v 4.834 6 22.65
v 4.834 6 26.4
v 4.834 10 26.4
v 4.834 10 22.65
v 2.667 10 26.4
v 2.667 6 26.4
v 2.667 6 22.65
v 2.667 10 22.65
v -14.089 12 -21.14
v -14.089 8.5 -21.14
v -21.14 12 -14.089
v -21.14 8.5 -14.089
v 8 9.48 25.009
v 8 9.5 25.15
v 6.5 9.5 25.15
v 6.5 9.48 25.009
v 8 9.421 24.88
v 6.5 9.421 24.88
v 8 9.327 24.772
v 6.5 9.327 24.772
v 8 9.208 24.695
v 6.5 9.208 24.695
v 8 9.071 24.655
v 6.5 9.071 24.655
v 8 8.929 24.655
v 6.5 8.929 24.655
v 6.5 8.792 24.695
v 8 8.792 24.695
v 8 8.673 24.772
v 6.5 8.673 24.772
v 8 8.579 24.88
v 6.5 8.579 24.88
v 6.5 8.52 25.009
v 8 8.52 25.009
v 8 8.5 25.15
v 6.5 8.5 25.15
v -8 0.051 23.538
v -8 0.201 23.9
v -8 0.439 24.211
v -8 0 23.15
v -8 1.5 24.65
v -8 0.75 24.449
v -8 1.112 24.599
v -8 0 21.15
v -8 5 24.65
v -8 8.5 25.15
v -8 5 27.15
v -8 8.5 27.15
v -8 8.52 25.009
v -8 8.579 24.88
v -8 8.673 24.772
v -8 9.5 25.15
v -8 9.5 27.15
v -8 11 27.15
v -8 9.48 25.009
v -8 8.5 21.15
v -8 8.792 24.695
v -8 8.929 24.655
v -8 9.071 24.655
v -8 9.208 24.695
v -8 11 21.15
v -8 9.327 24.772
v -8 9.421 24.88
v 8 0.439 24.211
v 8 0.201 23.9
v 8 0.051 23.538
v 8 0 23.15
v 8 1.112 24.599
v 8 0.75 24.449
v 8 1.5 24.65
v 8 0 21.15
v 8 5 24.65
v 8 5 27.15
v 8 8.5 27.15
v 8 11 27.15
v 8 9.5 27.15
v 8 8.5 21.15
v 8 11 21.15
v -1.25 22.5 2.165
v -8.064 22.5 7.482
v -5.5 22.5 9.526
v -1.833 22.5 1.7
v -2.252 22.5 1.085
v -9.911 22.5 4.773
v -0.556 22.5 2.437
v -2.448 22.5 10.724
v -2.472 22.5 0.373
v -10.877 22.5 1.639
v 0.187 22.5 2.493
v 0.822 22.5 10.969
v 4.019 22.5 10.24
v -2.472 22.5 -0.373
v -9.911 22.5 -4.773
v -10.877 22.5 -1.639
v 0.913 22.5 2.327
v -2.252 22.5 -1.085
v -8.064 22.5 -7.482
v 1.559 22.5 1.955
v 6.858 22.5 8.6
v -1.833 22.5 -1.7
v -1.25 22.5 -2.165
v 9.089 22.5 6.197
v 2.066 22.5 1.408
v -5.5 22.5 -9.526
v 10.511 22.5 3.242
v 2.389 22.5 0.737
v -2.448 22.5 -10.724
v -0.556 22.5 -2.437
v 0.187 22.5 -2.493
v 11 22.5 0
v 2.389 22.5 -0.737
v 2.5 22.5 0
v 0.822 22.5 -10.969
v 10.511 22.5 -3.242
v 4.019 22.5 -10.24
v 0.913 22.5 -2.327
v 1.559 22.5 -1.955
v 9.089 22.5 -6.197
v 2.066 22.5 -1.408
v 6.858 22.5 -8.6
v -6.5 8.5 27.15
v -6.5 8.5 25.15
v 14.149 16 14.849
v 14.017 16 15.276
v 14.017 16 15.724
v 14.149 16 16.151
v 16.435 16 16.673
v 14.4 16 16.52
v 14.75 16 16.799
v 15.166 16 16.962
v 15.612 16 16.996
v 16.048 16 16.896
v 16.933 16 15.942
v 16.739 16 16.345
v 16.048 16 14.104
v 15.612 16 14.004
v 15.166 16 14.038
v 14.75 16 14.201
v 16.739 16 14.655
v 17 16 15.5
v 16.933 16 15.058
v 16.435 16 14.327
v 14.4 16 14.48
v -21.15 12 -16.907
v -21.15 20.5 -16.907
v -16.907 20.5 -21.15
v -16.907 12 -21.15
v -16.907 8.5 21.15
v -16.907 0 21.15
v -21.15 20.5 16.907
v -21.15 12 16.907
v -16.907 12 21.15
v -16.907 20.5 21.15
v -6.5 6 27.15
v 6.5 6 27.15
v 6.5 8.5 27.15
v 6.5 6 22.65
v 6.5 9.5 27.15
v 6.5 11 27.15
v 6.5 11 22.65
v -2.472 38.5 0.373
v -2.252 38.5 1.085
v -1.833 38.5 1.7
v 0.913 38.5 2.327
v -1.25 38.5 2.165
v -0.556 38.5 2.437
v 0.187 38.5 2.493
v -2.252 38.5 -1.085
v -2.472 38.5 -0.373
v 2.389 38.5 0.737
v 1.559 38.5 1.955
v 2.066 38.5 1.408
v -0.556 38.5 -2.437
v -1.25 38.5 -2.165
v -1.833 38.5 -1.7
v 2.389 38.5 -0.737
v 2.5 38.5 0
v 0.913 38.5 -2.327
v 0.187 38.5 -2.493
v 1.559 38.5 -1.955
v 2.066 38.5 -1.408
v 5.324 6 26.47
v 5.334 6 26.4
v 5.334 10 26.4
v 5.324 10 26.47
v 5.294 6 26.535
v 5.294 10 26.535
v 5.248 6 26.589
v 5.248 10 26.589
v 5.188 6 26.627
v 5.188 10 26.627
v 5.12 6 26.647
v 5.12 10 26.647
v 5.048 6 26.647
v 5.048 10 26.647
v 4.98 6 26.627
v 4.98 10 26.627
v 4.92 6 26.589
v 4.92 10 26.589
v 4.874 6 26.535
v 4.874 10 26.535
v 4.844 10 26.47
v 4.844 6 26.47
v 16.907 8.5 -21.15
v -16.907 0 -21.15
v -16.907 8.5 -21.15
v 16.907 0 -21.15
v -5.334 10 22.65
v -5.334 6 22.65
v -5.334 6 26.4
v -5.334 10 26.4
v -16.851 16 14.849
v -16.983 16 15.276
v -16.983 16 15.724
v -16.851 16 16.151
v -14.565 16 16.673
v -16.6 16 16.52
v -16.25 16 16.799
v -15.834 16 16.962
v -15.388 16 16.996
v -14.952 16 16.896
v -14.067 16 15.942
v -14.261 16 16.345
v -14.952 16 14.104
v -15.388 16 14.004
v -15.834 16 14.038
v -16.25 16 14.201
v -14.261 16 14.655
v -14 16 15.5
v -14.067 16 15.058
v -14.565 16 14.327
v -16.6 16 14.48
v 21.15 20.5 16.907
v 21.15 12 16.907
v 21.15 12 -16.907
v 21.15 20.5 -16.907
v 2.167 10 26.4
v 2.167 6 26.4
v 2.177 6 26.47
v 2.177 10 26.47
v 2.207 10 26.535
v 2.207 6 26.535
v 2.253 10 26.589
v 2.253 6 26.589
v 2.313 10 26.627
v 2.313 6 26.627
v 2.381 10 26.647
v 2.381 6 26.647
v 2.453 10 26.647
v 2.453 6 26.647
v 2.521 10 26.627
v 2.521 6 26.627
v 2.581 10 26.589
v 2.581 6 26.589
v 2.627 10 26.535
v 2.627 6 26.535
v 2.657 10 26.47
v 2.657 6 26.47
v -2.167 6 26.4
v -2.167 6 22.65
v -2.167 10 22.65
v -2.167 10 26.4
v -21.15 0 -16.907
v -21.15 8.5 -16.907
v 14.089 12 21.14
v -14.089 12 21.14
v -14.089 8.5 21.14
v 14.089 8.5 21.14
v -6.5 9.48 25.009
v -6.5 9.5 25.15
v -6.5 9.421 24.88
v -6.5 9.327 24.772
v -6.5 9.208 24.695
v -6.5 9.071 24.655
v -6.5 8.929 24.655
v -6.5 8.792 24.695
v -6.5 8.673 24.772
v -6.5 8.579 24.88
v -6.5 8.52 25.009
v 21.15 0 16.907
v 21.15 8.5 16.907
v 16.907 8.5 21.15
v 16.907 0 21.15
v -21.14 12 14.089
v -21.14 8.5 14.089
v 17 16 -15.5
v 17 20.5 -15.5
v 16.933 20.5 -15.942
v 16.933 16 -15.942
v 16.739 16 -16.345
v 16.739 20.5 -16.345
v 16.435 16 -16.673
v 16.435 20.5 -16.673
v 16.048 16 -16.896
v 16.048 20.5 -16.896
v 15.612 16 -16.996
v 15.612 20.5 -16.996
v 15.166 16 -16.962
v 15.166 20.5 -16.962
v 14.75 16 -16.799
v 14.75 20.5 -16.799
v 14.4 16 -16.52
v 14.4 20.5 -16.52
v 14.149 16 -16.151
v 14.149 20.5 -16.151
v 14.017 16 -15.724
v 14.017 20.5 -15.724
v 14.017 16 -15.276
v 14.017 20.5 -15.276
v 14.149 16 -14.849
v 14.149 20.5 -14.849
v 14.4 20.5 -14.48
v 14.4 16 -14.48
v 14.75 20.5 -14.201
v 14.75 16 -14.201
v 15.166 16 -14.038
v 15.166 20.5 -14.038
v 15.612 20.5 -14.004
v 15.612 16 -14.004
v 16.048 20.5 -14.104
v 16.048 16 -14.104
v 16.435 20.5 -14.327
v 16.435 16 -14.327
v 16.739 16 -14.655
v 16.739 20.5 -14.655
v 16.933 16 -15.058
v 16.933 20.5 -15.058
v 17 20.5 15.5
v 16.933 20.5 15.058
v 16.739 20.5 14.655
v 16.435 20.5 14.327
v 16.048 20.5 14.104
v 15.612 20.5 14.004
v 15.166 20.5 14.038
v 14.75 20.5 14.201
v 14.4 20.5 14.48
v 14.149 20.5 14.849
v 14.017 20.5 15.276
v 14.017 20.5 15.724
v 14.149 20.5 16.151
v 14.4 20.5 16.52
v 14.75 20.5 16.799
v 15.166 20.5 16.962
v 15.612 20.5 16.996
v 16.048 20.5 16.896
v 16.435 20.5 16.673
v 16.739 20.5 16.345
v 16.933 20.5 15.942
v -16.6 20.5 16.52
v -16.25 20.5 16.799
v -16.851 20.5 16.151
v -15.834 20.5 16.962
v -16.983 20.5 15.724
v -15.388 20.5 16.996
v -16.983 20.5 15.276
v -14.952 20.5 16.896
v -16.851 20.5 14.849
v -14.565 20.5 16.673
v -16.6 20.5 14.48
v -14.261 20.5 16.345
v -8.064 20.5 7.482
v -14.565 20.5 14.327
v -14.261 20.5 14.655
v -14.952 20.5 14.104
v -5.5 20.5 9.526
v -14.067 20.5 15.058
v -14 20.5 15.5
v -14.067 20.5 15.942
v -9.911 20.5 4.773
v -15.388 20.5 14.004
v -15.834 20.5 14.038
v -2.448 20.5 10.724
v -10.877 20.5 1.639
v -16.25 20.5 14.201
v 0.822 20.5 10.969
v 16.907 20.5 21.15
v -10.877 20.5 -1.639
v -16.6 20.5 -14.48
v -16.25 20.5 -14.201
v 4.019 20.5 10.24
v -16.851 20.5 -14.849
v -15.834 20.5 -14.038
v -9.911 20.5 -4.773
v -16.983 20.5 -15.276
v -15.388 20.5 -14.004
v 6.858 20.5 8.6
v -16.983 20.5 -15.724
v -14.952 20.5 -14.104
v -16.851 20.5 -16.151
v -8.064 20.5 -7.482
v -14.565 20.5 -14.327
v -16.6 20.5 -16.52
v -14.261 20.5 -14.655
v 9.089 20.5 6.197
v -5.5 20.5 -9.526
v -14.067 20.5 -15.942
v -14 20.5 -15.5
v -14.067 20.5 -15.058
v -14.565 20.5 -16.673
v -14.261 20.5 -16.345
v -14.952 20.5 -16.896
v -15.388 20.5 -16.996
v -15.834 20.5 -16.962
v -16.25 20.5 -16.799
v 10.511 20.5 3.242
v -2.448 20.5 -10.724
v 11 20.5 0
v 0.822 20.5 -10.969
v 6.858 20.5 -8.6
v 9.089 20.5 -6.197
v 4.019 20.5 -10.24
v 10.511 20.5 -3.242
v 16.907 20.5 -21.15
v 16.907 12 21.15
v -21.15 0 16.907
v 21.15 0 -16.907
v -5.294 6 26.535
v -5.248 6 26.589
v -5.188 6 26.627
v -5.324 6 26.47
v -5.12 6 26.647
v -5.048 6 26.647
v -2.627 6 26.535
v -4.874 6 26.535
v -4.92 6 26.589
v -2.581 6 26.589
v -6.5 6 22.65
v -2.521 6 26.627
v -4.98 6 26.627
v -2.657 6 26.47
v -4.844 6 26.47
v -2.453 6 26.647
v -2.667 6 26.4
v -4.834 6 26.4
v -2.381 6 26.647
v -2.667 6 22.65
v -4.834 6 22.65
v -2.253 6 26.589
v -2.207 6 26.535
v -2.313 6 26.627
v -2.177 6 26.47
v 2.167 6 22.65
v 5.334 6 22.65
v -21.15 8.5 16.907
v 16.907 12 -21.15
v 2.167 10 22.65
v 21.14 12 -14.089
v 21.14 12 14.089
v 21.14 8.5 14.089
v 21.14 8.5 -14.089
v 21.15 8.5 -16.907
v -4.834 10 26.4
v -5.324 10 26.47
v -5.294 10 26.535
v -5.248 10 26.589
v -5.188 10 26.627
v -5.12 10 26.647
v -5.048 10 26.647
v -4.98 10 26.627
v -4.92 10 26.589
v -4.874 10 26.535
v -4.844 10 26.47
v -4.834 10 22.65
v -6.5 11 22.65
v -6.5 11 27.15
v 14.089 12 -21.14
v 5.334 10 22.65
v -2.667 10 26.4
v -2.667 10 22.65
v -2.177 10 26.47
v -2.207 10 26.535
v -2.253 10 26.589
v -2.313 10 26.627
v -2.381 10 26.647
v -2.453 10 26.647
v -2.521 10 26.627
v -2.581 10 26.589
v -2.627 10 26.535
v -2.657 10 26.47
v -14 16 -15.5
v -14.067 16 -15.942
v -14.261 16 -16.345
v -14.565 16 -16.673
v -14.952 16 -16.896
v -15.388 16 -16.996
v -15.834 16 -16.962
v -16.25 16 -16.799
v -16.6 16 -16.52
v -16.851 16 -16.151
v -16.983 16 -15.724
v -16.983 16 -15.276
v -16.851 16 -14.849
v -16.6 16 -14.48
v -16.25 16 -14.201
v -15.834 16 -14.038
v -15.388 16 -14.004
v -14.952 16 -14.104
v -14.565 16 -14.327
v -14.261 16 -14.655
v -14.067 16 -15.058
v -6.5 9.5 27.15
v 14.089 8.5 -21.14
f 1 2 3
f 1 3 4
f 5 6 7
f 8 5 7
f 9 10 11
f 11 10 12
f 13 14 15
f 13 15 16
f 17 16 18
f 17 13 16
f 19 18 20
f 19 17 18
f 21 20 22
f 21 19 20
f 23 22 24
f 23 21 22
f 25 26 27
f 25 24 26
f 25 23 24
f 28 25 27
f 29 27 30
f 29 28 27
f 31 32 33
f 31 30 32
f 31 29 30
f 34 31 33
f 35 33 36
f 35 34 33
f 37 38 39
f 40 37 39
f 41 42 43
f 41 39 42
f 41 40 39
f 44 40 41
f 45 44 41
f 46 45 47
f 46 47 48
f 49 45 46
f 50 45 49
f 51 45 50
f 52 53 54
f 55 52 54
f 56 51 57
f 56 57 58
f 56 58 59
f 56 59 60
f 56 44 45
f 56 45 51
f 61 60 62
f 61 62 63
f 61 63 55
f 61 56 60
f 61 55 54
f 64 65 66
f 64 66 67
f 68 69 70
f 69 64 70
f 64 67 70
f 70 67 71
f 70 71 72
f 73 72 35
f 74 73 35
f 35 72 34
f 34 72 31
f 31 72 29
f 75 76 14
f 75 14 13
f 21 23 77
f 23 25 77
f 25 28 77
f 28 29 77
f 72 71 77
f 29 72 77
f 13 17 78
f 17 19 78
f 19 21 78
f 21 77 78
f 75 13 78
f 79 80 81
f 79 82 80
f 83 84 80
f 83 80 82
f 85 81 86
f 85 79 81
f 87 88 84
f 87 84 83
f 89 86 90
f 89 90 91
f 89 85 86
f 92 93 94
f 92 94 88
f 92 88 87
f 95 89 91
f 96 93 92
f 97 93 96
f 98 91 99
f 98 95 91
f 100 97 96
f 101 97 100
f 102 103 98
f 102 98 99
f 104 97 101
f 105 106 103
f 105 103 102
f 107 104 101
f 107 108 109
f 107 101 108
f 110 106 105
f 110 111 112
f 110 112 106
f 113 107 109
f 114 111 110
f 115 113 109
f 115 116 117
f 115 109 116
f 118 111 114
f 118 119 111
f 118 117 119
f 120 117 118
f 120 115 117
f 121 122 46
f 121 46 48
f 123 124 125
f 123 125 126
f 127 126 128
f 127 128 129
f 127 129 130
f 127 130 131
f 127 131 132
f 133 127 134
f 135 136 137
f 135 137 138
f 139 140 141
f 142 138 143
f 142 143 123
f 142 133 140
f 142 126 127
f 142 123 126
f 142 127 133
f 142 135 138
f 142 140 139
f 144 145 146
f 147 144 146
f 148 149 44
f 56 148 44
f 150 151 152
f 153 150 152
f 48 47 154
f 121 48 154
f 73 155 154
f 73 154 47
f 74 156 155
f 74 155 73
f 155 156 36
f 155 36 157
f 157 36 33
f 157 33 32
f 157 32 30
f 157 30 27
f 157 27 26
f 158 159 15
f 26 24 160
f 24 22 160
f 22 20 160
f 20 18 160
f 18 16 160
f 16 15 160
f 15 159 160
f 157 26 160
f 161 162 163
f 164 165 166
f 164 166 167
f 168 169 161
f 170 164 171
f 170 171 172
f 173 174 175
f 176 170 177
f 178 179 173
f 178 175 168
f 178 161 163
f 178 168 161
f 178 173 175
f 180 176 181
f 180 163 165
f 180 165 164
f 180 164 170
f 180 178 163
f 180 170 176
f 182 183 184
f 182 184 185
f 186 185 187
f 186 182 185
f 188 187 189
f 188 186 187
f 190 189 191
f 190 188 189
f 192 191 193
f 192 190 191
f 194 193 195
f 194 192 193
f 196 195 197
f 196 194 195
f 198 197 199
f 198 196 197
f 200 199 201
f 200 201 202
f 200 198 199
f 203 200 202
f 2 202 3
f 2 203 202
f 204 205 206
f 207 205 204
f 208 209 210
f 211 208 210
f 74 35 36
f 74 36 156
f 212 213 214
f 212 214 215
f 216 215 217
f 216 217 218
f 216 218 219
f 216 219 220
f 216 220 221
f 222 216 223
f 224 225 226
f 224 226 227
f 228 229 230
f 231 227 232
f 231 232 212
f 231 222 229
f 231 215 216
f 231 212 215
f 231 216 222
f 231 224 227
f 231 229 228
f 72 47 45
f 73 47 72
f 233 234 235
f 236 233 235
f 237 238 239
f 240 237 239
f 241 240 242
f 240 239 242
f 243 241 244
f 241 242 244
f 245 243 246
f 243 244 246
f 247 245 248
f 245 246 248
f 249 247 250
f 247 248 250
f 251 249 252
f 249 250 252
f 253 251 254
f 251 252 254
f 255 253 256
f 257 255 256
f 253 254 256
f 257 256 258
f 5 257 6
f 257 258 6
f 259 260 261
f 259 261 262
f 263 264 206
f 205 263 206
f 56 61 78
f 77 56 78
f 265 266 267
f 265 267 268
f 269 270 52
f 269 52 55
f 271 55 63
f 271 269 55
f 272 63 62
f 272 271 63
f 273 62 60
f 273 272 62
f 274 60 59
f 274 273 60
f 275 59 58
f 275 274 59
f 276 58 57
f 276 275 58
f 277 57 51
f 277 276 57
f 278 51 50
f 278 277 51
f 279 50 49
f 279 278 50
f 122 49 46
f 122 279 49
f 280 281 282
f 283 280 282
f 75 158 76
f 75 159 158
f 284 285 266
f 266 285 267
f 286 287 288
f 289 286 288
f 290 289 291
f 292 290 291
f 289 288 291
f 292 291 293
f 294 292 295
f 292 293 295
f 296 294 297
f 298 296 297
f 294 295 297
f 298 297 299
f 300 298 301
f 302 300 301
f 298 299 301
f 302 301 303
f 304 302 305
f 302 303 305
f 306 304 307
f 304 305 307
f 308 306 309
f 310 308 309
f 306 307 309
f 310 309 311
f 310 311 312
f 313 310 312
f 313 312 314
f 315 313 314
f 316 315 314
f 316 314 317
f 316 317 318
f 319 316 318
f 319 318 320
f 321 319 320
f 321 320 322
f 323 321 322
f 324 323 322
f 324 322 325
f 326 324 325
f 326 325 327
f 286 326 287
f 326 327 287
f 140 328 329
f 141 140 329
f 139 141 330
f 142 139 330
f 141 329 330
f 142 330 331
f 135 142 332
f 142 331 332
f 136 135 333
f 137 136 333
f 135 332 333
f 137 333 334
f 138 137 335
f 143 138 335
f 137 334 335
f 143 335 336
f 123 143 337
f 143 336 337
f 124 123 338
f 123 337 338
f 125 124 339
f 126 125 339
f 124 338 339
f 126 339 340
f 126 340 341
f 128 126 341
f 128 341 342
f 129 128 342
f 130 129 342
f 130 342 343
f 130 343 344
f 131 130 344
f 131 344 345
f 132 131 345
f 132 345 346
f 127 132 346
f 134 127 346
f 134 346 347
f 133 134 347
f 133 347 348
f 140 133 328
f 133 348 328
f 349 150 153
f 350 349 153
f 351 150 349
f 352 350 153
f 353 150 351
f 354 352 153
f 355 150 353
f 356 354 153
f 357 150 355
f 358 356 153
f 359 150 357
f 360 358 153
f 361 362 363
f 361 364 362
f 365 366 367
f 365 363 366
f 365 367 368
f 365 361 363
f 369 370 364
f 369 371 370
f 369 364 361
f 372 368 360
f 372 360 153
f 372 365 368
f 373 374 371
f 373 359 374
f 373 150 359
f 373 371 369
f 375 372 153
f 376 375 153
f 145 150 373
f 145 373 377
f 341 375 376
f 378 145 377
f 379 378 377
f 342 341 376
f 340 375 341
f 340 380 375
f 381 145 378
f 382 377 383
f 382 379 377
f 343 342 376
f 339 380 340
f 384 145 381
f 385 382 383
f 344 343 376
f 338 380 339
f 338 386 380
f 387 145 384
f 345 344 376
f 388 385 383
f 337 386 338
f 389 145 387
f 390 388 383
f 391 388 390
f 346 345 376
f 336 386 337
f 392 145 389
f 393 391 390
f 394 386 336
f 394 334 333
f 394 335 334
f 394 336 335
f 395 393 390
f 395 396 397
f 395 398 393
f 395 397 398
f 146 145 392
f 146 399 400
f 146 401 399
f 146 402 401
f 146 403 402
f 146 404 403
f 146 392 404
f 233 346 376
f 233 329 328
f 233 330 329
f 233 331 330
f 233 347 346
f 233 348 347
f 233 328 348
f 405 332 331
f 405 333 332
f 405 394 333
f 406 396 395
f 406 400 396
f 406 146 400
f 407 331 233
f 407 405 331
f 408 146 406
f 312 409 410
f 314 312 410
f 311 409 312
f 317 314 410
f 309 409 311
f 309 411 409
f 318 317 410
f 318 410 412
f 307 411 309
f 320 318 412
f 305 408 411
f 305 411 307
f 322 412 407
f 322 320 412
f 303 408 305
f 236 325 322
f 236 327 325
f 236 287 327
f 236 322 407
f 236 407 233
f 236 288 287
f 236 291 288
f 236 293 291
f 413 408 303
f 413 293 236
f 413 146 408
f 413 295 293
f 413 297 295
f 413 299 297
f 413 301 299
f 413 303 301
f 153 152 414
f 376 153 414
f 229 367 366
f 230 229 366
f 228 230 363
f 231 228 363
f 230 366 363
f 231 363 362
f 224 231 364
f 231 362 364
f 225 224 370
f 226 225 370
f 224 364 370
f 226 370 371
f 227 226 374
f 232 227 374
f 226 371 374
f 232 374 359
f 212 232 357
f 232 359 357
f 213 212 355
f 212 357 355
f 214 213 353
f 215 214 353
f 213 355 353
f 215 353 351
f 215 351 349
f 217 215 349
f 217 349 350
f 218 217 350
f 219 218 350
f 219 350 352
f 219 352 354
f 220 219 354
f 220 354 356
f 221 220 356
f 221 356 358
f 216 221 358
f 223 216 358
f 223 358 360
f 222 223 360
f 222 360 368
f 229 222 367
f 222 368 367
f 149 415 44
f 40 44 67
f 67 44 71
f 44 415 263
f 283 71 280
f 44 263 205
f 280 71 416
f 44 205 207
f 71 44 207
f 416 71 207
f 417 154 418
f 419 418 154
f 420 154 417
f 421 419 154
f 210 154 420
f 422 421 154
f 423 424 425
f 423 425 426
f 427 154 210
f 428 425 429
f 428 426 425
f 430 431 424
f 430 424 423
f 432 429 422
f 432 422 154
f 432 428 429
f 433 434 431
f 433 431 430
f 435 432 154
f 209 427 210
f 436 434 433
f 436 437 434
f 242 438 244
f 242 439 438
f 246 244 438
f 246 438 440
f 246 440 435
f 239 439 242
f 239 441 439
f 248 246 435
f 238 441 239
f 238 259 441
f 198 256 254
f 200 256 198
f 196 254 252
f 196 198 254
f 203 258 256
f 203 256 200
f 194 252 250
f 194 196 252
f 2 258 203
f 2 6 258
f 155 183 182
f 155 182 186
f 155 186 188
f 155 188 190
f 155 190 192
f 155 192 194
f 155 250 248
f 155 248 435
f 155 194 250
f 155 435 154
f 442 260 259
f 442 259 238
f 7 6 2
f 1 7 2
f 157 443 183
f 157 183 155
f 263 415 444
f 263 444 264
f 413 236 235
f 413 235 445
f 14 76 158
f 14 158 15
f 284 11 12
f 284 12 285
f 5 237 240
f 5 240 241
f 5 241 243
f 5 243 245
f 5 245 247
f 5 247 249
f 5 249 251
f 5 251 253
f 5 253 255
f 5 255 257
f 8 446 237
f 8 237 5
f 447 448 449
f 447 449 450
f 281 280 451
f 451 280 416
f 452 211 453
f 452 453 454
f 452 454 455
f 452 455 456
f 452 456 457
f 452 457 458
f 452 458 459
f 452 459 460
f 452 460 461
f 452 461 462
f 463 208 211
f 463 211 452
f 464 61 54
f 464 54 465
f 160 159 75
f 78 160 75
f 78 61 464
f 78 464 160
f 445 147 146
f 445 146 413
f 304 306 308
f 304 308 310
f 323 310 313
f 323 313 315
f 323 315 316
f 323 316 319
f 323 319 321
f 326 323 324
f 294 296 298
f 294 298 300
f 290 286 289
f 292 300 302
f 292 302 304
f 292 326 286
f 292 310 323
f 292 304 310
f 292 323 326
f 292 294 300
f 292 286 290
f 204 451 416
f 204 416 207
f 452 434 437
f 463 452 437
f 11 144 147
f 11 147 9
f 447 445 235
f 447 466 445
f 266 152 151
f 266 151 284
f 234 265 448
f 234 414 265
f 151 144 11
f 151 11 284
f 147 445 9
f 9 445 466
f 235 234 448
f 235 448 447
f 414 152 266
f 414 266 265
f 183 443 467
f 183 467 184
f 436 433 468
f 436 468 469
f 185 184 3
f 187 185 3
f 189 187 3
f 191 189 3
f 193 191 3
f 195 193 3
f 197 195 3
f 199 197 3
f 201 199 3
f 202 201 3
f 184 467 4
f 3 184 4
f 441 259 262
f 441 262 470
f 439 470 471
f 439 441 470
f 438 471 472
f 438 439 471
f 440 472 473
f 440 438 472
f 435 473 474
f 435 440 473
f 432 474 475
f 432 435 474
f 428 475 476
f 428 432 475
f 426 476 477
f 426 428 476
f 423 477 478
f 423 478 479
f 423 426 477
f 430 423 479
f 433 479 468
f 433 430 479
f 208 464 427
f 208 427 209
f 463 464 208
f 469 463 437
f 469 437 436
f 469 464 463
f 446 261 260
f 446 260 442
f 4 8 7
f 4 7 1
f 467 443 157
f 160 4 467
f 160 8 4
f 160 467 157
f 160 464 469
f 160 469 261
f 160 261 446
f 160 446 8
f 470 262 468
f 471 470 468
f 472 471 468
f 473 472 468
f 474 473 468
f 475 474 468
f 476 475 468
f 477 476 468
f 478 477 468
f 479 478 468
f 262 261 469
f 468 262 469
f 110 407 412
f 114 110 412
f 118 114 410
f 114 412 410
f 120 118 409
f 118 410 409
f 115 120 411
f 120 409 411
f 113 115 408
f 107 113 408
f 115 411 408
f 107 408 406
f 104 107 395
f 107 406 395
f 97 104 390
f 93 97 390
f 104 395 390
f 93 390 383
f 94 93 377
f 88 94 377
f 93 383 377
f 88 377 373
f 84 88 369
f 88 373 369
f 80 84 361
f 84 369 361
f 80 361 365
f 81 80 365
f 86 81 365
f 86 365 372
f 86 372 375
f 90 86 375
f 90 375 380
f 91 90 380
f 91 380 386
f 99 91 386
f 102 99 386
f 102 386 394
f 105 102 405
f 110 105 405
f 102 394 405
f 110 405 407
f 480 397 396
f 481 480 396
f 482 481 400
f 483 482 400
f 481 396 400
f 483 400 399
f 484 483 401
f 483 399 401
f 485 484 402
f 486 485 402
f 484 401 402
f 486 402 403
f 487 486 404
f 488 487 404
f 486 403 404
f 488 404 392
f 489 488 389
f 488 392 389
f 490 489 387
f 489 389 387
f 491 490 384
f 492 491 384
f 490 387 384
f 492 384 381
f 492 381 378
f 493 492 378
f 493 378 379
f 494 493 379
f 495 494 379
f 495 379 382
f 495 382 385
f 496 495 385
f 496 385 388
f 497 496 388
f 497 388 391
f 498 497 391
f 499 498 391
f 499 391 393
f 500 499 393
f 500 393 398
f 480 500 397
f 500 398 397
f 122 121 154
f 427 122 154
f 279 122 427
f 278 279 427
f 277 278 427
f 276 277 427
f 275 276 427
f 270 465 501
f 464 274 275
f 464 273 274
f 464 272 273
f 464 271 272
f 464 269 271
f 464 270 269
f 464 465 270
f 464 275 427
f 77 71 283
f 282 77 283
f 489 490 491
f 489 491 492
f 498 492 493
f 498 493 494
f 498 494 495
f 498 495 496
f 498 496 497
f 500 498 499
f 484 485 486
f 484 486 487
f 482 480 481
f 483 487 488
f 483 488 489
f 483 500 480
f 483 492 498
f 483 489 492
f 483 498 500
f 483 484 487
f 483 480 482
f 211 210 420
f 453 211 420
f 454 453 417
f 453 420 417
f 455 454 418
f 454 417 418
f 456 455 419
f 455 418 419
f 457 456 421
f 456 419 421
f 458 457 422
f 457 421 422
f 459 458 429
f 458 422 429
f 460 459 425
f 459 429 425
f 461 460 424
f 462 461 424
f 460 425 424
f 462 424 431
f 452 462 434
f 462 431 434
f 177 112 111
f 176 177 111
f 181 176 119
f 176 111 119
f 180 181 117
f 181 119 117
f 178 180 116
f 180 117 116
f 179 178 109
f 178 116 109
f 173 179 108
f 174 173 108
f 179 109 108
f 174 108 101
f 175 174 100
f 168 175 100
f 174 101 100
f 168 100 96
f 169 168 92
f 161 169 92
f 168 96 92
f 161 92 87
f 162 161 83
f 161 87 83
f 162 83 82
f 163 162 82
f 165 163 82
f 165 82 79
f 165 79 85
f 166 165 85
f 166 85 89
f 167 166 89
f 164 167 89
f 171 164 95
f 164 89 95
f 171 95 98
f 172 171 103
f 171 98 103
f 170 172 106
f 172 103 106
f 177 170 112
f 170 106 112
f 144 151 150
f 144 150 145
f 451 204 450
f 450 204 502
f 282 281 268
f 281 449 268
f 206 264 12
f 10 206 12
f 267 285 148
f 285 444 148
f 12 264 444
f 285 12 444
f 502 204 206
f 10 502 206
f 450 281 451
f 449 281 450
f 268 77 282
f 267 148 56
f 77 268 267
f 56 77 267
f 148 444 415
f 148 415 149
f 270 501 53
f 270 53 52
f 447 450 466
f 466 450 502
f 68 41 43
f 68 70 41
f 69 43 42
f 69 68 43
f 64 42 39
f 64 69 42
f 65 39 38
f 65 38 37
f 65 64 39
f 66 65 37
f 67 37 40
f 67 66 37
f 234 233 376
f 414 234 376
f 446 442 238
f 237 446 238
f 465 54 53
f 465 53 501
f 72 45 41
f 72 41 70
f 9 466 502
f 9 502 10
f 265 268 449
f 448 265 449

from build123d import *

# Parameters (mm, degrees)
SKETCH1_W               = 42.3
SKETCH1_H               = 42.3
BOSS_EXTRUDE1_DEPTH     = 20.5
SKETCH2_R               = 11
BOSS_EXTRUDE2_DEPTH     = 2
SKETCH3_R               = 2.5
BOSS_EXTRUDE3_DEPTH     = 16
CUT_EXTRUDE1_DEPTH      = 19
CUT_EXTRUDE1_DEPTH_BACK = 21.5
SKETCH5_W               = 33.814718626
SKETCH5_H               = 3.5
CUT_EXTRUDE2_DEPTH      = 0.01
CUT_EXTRUDE3_START      = -12
CUT_EXTRUDE3_DEPTH      = 3.5
CIRPATTERN1_COUNT       = 4
SKETCH7_R               = 1.5
CUT_EXTRUDE4_DEPTH      = 4.5
SKETCH8_W               = 16
SKETCH8_H               = 11
BOSS_EXTRUDE4_DEPTH     = 6
SKETCH9_W               = 16
SKETCH9_H               = 5
CUT_EXTRUDE5_DEPTH      = 2.5
FILLET1_R               = 1.5
SKETCH10_W              = 13
SKETCH10_H              = 4.5
CUT_EXTRUDE6_DEPTH      = 5
CUT_EXTRUDE7_DEPTH      = 30.15
BOSS_EXTRUDE5_DEPTH     = 4


with BuildPart() as part:
    # Sketch1 → Boss-Extrude1 (new body)
    with BuildSketch(Plane(origin=(0, 0, 0), x_dir=(1, 0, 0), z_dir=(0, 1, 0))):
        Rectangle(SKETCH1_W, SKETCH1_H)
    extrude(amount=BOSS_EXTRUDE1_DEPTH)

    # Sketch2 → Boss-Extrude2 (add)
    with BuildSketch(Plane(origin=(0, 20.5, 0), x_dir=(1, 0, 0), z_dir=(0, 1, 0))):
        Circle(SKETCH2_R)
    extrude(amount=BOSS_EXTRUDE2_DEPTH)

    # Sketch3 → Boss-Extrude3 (add)
    with BuildSketch(Plane(origin=(0, 22.5, 0), x_dir=(1, 0, 0), z_dir=(0, 1, 0))):
        Circle(SKETCH3_R)
    extrude(amount=BOSS_EXTRUDE3_DEPTH)

    # Sketch4 → Cut-Extrude1 (cut, two sides)
    with BuildSketch(Plane(origin=(0, 20.5, 0), x_dir=(1, 0, 0), z_dir=(0, 1, 0))) as cut_extrude1_sk:
        Polygon((-21.15, 16.907359313), (-16.907359313, 21.15), (-21.15, 21.15), align=None)
        Polygon((21.15, 21.15), (21.15, 16.907359313), (16.907359313, 21.15), align=None)
        Polygon((21.15, -16.907359313), (16.907359313, -21.15), (21.15, -21.15), align=None)
        Polygon((-21.15, -21.15), (-21.15, -16.907359313), (-16.907359313, -21.15), align=None)
    extrude(amount=CUT_EXTRUDE1_DEPTH, mode=Mode.SUBTRACT)
    extrude(cut_extrude1_sk.sketch, amount=-CUT_EXTRUDE1_DEPTH_BACK, mode=Mode.SUBTRACT)

    # Sketch5 → Cut-Extrude2 (cut)
    with BuildSketch(Plane(origin=(21.15, 0, 0), x_dir=(0, 0, -1), z_dir=(1, 0, 0))):
        with Locations((0, 10.25)):
            Rectangle(SKETCH5_W, SKETCH5_H)
    cut_extrude2 = extrude(amount=-CUT_EXTRUDE2_DEPTH, mode=Mode.SUBTRACT)

    # Sketch6 → Cut-Extrude3 (cut)
    with BuildSketch(Plane(origin=(0, 20.5, 0), x_dir=(1, 0, 0), z_dir=(0, 1, 0)).offset(CUT_EXTRUDE3_START)):
        Polygon((21.15, 14.078932188), (14.078932188, 21.15), (21.15, 21.15), align=None)
    cut_extrude3 = extrude(amount=CUT_EXTRUDE3_DEPTH, mode=Mode.SUBTRACT)

    # CirPattern1: Cut-Extrude2, Cut-Extrude3 ×4 about axis
    cirpattern1_axis = Axis((0, 0, 0), (0, 1, 0))
    for i in range(1, CIRPATTERN1_COUNT):
        add(cut_extrude2.rotate(cirpattern1_axis, i * 360 / CIRPATTERN1_COUNT), mode=Mode.SUBTRACT)
        add(cut_extrude3.rotate(cirpattern1_axis, i * 360 / CIRPATTERN1_COUNT), mode=Mode.SUBTRACT)

    # Sketch7 → Cut-Extrude4 (cut)
    with BuildSketch(Plane(origin=(0, 20.5, 0), x_dir=(1, 0, 0), z_dir=(0, 1, 0))):
        with Locations((15.5, 15.5)):
            Circle(SKETCH7_R)
        with Locations((15.5, -15.5)):
            Circle(SKETCH7_R)
        with Locations((-15.5, -15.5)):
            Circle(SKETCH7_R)
        with Locations((-15.5, 15.5)):
            Circle(SKETCH7_R)
    extrude(amount=-CUT_EXTRUDE4_DEPTH, mode=Mode.SUBTRACT)

    # Sketch8 → Boss-Extrude4 (add)
    with BuildSketch(Plane.XY.offset(21.15)):
        with Locations((0, 5.5)):
            Rectangle(SKETCH8_W, SKETCH8_H)
    extrude(amount=BOSS_EXTRUDE4_DEPTH)

    # Sketch9 → Cut-Extrude5 (cut)
    with BuildSketch(Plane.XY.offset(27.15)):
        with Locations((0, 2.5)):
            Rectangle(SKETCH9_W, SKETCH9_H)
    extrude(amount=-CUT_EXTRUDE5_DEPTH, mode=Mode.SUBTRACT)

    # Fillet1
    fillet1_edges = [part.edges().sort_by_distance(p)[0] for p in [
        (0, 0, 24.65),
    ]]
    fillet(fillet1_edges, radius=FILLET1_R)

    # Sketch10 → Cut-Extrude6 (cut)
    with BuildSketch(Plane(origin=(0, 11, 0), x_dir=(1, 0, 0), z_dir=(0, 1, 0))):
        with Locations((0, -24.9)):
            Rectangle(SKETCH10_W, SKETCH10_H)
    extrude(amount=-CUT_EXTRUDE6_DEPTH, mode=Mode.SUBTRACT)

    # Sketch11 → Cut-Extrude7 (cut, through all)
    with BuildSketch(Plane(origin=(8, 0, 0), x_dir=(0, 0, -1), z_dir=(1, 0, 0))):
        with BuildLine():
            Line((-27.15, 9.5), (-25.15, 9.5))
            ThreePointArc((-25.15, 9.5), (-24.65, 9), (-25.15, 8.5))
            Line((-25.15, 8.5), (-27.15, 8.5))
            Line((-27.15, 8.5), (-27.15, 9.5))
        make_face()
    extrude(amount=-CUT_EXTRUDE7_DEPTH, mode=Mode.SUBTRACT)

    # Sketch12 → Boss-Extrude5 (add)
    with BuildSketch(Plane(origin=(0, 6, 0), x_dir=(1, 0, 0), z_dir=(0, 1, 0))):
        with BuildLine():
            Line((-2.667, -22.65), (-2.167, -22.65))
            Line((-2.167, -22.65), (-2.167, -26.4))
            ThreePointArc((-2.167, -26.4), (-2.417, -26.65), (-2.667, -26.4))
            Line((-2.667, -26.4), (-2.667, -22.65))
        make_face()
        with BuildLine():
            Line((5.334, -22.65), (5.334, -26.4))
            ThreePointArc((5.334, -26.4), (5.084, -26.65), (4.834, -26.4))
            Line((4.834, -26.4), (4.834, -22.65))
            Line((4.834, -22.65), (5.334, -22.65))
        make_face()
        with BuildLine():
            Line((-4.834, -22.65), (-5.334, -22.65))
            Line((-5.334, -22.65), (-5.334, -26.4))
            ThreePointArc((-5.334, -26.4), (-5.084, -26.65), (-4.834, -26.4))
            Line((-4.834, -26.4), (-4.834, -22.65))
        make_face()
        with BuildLine():
            Line((2.167, -22.65), (2.167, -26.4))
            ThreePointArc((2.167, -26.4), (2.417, -26.65), (2.667, -26.4))
            Line((2.667, -26.4), (2.667, -22.65))
            Line((2.667, -22.65), (2.167, -22.65))
        make_face()
    extrude(amount=BOSS_EXTRUDE5_DEPTH)


solid = part.part
